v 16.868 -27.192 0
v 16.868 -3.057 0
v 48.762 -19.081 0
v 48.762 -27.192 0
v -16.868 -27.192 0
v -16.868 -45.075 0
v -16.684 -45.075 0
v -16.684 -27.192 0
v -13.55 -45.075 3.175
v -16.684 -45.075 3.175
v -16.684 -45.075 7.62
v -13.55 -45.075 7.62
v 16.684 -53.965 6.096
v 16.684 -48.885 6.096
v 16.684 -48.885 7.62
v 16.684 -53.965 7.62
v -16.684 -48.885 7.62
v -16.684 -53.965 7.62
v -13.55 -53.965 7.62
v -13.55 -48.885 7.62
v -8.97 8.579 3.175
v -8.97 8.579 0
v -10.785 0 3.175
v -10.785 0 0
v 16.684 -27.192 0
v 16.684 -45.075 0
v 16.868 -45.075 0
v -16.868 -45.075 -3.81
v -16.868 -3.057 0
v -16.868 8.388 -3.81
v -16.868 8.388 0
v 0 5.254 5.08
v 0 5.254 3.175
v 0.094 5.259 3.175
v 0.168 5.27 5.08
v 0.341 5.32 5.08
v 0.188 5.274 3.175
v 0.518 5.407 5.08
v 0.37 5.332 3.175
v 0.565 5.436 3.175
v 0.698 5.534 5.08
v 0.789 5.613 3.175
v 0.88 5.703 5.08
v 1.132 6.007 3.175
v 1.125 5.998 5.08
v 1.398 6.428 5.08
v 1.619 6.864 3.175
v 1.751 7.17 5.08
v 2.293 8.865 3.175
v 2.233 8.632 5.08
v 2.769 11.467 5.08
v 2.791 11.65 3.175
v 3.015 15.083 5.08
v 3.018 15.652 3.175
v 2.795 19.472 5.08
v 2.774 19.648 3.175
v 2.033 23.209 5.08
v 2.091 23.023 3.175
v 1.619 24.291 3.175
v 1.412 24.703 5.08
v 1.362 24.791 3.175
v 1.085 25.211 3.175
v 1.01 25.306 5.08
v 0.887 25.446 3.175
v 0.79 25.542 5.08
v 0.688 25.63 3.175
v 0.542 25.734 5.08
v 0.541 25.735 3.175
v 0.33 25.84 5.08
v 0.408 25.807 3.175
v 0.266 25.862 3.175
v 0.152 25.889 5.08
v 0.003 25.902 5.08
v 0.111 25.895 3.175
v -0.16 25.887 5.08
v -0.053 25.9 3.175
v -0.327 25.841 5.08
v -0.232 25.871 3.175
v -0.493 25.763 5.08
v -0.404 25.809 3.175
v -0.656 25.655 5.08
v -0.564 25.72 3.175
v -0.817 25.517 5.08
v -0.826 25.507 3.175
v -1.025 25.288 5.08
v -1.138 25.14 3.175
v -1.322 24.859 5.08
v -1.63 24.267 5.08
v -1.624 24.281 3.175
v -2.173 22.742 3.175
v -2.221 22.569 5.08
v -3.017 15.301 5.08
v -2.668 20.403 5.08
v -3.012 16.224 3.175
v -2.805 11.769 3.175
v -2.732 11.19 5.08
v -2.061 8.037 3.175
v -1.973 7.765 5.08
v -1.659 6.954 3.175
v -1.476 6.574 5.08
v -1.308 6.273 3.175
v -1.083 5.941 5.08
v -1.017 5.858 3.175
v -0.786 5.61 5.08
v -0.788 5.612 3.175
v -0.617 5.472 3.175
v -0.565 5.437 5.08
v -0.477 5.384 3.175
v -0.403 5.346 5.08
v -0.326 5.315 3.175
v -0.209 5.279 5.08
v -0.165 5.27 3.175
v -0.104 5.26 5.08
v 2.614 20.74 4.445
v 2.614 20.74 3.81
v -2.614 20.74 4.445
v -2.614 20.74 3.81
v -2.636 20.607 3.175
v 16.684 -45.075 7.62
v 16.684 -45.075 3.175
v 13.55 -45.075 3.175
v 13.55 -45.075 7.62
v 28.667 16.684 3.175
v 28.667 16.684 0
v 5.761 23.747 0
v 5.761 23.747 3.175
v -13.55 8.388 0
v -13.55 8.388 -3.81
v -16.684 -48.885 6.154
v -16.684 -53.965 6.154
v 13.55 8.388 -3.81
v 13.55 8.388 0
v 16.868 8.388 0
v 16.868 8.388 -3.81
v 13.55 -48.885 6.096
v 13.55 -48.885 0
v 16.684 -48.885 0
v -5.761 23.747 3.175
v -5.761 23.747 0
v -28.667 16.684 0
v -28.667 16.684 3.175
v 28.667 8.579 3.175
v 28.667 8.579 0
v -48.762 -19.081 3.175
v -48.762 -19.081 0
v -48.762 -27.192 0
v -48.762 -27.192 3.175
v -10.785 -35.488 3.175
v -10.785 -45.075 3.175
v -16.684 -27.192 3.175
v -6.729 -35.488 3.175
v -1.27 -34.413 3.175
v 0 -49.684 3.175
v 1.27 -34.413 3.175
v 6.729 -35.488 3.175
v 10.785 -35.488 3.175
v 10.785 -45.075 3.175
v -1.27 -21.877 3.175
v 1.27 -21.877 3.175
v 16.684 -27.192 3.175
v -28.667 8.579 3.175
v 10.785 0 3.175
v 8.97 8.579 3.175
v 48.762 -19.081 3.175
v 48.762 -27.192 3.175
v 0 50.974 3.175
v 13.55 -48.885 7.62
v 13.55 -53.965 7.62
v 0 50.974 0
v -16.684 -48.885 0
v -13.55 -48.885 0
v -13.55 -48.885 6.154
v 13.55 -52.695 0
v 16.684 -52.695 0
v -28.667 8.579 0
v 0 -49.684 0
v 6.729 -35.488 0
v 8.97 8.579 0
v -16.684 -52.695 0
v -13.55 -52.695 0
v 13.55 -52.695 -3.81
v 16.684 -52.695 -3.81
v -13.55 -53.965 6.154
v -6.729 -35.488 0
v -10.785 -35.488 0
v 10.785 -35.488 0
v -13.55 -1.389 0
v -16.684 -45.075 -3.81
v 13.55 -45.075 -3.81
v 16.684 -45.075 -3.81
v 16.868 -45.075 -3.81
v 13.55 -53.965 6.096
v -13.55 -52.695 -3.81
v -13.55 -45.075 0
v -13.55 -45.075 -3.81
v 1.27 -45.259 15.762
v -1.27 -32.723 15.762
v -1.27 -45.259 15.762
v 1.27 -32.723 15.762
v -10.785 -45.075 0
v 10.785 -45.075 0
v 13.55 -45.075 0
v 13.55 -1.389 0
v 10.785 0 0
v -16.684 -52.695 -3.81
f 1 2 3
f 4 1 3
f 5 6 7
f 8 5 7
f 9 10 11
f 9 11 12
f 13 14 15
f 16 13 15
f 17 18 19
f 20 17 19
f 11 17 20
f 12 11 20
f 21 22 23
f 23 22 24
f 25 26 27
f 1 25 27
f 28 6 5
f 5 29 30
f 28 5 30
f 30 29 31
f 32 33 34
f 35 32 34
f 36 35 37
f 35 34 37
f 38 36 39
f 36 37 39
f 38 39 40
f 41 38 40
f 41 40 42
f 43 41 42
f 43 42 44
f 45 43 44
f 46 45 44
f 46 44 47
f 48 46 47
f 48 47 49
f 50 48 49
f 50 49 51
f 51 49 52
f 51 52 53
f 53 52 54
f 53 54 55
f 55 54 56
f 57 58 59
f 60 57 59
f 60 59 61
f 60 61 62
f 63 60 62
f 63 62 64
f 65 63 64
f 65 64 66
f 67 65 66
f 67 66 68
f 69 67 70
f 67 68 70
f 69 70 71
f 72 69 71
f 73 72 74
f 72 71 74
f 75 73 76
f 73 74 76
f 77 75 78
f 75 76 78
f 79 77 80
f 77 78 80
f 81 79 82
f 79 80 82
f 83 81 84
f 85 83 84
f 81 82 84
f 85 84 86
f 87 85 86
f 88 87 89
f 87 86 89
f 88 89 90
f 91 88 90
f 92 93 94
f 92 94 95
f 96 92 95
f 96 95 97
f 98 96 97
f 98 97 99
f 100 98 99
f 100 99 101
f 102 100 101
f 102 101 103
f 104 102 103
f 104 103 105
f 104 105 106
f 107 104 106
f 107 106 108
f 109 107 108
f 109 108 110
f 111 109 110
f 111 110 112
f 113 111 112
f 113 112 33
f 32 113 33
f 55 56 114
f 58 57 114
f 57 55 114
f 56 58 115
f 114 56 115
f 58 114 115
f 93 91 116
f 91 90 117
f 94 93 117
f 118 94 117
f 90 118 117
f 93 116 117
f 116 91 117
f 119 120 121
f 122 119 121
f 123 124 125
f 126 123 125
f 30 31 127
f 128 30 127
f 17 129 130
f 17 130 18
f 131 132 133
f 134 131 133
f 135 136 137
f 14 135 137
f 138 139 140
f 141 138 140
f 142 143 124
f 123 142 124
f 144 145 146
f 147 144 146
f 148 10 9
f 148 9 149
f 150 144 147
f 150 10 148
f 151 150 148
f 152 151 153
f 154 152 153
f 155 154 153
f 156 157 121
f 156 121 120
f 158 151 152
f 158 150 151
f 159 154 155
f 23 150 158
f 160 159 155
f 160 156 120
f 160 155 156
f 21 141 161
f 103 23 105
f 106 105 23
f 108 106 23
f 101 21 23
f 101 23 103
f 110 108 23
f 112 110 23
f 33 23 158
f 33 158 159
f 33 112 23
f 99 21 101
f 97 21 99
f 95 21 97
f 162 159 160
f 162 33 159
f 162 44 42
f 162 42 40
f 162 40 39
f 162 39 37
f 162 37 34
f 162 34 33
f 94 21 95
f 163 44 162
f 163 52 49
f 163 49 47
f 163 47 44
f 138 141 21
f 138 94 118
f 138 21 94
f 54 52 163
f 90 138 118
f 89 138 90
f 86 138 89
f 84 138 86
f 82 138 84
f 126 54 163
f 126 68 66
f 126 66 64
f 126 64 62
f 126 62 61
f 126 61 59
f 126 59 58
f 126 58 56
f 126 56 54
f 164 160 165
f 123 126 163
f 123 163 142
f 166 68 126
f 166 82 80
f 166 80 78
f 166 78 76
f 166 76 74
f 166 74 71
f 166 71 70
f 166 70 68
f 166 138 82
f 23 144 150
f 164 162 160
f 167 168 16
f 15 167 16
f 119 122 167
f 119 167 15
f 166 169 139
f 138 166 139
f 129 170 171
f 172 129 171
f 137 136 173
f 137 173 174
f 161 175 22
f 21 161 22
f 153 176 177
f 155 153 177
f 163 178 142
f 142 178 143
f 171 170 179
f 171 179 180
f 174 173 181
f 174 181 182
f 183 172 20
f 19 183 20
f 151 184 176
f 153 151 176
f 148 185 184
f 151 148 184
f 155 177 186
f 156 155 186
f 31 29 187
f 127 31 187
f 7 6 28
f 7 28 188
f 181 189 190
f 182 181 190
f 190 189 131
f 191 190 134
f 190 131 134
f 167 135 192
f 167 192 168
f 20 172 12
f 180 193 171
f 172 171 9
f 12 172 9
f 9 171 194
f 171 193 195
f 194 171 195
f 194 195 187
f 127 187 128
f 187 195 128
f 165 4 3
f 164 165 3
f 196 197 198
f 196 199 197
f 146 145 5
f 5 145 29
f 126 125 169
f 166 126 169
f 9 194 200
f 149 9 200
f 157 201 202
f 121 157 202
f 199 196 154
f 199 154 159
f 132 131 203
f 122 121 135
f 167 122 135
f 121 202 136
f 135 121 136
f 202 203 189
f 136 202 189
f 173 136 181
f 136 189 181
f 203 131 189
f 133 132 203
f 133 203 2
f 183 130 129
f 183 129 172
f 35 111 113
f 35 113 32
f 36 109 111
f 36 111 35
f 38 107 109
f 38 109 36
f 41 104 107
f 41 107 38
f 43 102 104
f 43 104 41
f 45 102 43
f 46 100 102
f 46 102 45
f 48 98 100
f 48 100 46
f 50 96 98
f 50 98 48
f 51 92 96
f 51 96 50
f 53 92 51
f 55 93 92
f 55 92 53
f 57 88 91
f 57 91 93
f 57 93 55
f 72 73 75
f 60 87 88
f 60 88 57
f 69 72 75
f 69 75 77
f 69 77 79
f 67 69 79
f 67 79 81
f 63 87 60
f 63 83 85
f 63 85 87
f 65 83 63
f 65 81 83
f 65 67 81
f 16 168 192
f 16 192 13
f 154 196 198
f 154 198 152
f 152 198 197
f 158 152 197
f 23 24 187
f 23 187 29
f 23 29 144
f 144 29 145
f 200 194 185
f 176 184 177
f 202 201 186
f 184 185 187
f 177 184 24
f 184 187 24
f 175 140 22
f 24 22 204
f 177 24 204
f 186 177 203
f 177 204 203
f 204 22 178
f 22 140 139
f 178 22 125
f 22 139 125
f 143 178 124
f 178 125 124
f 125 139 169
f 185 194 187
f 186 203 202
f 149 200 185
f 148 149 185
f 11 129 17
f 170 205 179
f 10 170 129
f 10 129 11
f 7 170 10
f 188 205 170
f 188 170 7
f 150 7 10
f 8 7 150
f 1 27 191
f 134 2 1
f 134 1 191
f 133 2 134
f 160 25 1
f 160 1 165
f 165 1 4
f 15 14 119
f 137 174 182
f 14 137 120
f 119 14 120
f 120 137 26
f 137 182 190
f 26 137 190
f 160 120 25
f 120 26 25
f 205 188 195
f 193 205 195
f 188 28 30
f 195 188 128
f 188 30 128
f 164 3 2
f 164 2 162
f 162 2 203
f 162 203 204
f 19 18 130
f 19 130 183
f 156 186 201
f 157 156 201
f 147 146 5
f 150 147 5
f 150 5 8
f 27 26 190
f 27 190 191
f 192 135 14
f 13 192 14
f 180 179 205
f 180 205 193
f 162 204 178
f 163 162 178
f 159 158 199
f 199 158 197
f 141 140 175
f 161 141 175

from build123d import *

# Parameters (mm, degrees)
F1_DEPTH      = 3.175
F3_DEPTH      = 5.08
F4_W          = 3.3183870837
F4_H          = 53.4629058093
F5_DEPTH      = 3.81
F7_DEPTH      = 1.27
F7_DEPTH_BACK = 1.27
F8_W          = 3.1340317801
F8_H          = 3.81
F9_W          = 3.1340317801
F9_H          = 3.81
F10_DEPTH     = 7.62
F11_W         = 3.1340317801
F11_H         = 3.81
F13_DEPTH     = 7.62
F15_W         = 3.1340317801
F15_H         = 1.5242329788
F14_W         = 3.1340317801
F14_H         = 1.4657561657
F16_DEPTH     = 5.08


with BuildPart() as f1:
    # F0 (on Top) → F1 (new body)
    with BuildSketch(Plane.XY):
        Polygon((-10.7847582549, 0), (0, 0), (0, 50.974112004), (-5.760514272, 23.7470668758), (-8.9697682119, 8.5785423791), align=None)
        Polygon((0, -49.6836304665), (0, 0), (-10.7847582549, 0), (-10.7847582549, -27.1923393011), (-10.7847582549, -35.488307476), (-6.7289522849, -35.488307476), align=None)
        Polygon((0, 50.974112004), (0, 0), (10.7847582549, 0), (8.9697682119, 8.5785423791), (5.760514272, 23.7470668758), align=None)
        Polygon((10.7847582549, 0), (0, 0), (0, -49.6836304665), (6.7289522849, -35.488307476), (10.7847582549, -35.488307476), (10.7847582549, -27.1923393011), align=None)
        Polygon((-10.7847582549, -27.1923393011), (-10.7847582549, 0), (-48.7618558109, -19.0807264298), (-48.7618558109, -27.1923393011), (-16.6841130704, -27.1923393011), align=None)
        Polygon((48.7618558109, -19.0807264298), (10.7847582549, 0), (10.7847582549, -27.1923393011), (16.6841130704, -27.1923393011), (48.7618558109, -27.1923393011), align=None)
        Polygon((-8.9697682119, 8.5785423791), (-5.760514272, 23.7470668758), (-28.667178005, 16.6841130704), (-28.667178005, 8.5785423791), align=None)
        Polygon((28.667178005, 16.6841130704), (5.760514272, 23.7470668758), (8.9697682119, 8.5785423791), (28.667178005, 8.5785423791), align=None)
        Polygon((-10.7847582549, -35.488307476), (-10.7847582549, -27.1923393011), (-16.6841130704, -27.1923393011), (-16.6841130704, -45.0747571886), (-10.7847582549, -45.0747571886), align=None)
        Polygon((16.6841130704, -27.1923393011), (10.7847582549, -27.1923393011), (10.7847582549, -35.488307476), (10.7847582549, -45.0747571886), (16.6841130704, -45.0747571886), align=None)
    extrude(amount=F1_DEPTH)

    # F2 (on Top) → F3 (join)
    with BuildSketch(Plane.XY):
        with BuildLine():
            add(Edge.make_bspline(
                [(0, 5.2541131154), (5.2276164738, 5.2541131154), (2.6138082369, 20.739919506), (0, 36.2257258967), (-2.6138082369, 20.739919506), (-5.2276164738, 5.2541131154), (0, 5.2541131154)],
                knots=[0, 0, 0, 2.0943951024, 2.0943951024, 4.1887902048, 4.1887902048, 6.2831853072, 6.2831853072, 6.2831853072], degree=2, weights=[1, 0.5, 1, 0.5, 1, 0.5, 1]))
        make_face()
    extrude(amount=F3_DEPTH)

    # F4 (on Top) → F5 (join)
    with BuildSketch(Plane.XY):
        with Locations((-15.2092748322, -18.3433080092)):
            Rectangle(F4_W, F4_H)
        with Locations((15.2092748322, -18.3433080092)):
            Rectangle(F4_W, F4_H)
    extrude(amount=-F5_DEPTH)

    # F6 (on Right) → F7 (join, two sides)
    with BuildSketch(Plane.YZ) as f7_sk:
        Polygon((-45.2591143548, 15.7623384148), (-33.4193573299, 2.0220931471), (-21.0011098534, 2.1588988602), (-32.7229835093, 15.7623384148), align=None)
    extrude(amount=F7_DEPTH)
    extrude(f7_sk.sketch, amount=-F7_DEPTH_BACK)



with BuildPart() as f10:
    # F8 (on face) + F9 (on face) → F10 (new body)
    with BuildSketch(Plane.XZ.offset(45.0747571886)):
        with Locations((-15.1170971803, -1.905)):
            Rectangle(F8_W, F8_H)
    with BuildSketch(Plane.XZ.offset(45.0747571886)):
        with Locations((15.1170971803, -1.905)):
            Rectangle(F9_W, F9_H)
    extrude(amount=F10_DEPTH)


with BuildPart() as f1_1:
    add(f1.part)

    add(f10.part)  # F13 merges F10
    # F11 (on face) + F12 (on face) → F13 (join)
    with BuildSketch(Plane.XY):
        with Locations((-15.1170971803, -46.9797571886)):
            Rectangle(F11_W, F11_H)
    with BuildSketch(Plane.XY):
        Polygon((13.5500812903, -45.0747571886), (13.5500812903, -48.8847571886), (16.6841130704, -48.8847609138), (16.6841130704, -45.0747571886), align=None)
    extrude(amount=F13_DEPTH)

    # F15 (on face) + F14 (on face) → F16 (join)
    with BuildSketch(Plane(origin=(-5.81072e-05, -48.8847410821, 0), x_dir=(1, -1.1887e-06, 0), z_dir=(-1.1887e-06, -1, 0))):
        with Locations((15.1171552876, 6.8578835106)):
            Rectangle(F15_W, F15_H)
    with BuildSketch(Plane.XZ.offset(48.8847571886)):
        with Locations((-15.1170971803, 6.8871219172)):
            Rectangle(F14_W, F14_H)
    extrude(amount=F16_DEPTH, dir=(-1.1887e-06, -1, 0))


solid = f1_1.part
